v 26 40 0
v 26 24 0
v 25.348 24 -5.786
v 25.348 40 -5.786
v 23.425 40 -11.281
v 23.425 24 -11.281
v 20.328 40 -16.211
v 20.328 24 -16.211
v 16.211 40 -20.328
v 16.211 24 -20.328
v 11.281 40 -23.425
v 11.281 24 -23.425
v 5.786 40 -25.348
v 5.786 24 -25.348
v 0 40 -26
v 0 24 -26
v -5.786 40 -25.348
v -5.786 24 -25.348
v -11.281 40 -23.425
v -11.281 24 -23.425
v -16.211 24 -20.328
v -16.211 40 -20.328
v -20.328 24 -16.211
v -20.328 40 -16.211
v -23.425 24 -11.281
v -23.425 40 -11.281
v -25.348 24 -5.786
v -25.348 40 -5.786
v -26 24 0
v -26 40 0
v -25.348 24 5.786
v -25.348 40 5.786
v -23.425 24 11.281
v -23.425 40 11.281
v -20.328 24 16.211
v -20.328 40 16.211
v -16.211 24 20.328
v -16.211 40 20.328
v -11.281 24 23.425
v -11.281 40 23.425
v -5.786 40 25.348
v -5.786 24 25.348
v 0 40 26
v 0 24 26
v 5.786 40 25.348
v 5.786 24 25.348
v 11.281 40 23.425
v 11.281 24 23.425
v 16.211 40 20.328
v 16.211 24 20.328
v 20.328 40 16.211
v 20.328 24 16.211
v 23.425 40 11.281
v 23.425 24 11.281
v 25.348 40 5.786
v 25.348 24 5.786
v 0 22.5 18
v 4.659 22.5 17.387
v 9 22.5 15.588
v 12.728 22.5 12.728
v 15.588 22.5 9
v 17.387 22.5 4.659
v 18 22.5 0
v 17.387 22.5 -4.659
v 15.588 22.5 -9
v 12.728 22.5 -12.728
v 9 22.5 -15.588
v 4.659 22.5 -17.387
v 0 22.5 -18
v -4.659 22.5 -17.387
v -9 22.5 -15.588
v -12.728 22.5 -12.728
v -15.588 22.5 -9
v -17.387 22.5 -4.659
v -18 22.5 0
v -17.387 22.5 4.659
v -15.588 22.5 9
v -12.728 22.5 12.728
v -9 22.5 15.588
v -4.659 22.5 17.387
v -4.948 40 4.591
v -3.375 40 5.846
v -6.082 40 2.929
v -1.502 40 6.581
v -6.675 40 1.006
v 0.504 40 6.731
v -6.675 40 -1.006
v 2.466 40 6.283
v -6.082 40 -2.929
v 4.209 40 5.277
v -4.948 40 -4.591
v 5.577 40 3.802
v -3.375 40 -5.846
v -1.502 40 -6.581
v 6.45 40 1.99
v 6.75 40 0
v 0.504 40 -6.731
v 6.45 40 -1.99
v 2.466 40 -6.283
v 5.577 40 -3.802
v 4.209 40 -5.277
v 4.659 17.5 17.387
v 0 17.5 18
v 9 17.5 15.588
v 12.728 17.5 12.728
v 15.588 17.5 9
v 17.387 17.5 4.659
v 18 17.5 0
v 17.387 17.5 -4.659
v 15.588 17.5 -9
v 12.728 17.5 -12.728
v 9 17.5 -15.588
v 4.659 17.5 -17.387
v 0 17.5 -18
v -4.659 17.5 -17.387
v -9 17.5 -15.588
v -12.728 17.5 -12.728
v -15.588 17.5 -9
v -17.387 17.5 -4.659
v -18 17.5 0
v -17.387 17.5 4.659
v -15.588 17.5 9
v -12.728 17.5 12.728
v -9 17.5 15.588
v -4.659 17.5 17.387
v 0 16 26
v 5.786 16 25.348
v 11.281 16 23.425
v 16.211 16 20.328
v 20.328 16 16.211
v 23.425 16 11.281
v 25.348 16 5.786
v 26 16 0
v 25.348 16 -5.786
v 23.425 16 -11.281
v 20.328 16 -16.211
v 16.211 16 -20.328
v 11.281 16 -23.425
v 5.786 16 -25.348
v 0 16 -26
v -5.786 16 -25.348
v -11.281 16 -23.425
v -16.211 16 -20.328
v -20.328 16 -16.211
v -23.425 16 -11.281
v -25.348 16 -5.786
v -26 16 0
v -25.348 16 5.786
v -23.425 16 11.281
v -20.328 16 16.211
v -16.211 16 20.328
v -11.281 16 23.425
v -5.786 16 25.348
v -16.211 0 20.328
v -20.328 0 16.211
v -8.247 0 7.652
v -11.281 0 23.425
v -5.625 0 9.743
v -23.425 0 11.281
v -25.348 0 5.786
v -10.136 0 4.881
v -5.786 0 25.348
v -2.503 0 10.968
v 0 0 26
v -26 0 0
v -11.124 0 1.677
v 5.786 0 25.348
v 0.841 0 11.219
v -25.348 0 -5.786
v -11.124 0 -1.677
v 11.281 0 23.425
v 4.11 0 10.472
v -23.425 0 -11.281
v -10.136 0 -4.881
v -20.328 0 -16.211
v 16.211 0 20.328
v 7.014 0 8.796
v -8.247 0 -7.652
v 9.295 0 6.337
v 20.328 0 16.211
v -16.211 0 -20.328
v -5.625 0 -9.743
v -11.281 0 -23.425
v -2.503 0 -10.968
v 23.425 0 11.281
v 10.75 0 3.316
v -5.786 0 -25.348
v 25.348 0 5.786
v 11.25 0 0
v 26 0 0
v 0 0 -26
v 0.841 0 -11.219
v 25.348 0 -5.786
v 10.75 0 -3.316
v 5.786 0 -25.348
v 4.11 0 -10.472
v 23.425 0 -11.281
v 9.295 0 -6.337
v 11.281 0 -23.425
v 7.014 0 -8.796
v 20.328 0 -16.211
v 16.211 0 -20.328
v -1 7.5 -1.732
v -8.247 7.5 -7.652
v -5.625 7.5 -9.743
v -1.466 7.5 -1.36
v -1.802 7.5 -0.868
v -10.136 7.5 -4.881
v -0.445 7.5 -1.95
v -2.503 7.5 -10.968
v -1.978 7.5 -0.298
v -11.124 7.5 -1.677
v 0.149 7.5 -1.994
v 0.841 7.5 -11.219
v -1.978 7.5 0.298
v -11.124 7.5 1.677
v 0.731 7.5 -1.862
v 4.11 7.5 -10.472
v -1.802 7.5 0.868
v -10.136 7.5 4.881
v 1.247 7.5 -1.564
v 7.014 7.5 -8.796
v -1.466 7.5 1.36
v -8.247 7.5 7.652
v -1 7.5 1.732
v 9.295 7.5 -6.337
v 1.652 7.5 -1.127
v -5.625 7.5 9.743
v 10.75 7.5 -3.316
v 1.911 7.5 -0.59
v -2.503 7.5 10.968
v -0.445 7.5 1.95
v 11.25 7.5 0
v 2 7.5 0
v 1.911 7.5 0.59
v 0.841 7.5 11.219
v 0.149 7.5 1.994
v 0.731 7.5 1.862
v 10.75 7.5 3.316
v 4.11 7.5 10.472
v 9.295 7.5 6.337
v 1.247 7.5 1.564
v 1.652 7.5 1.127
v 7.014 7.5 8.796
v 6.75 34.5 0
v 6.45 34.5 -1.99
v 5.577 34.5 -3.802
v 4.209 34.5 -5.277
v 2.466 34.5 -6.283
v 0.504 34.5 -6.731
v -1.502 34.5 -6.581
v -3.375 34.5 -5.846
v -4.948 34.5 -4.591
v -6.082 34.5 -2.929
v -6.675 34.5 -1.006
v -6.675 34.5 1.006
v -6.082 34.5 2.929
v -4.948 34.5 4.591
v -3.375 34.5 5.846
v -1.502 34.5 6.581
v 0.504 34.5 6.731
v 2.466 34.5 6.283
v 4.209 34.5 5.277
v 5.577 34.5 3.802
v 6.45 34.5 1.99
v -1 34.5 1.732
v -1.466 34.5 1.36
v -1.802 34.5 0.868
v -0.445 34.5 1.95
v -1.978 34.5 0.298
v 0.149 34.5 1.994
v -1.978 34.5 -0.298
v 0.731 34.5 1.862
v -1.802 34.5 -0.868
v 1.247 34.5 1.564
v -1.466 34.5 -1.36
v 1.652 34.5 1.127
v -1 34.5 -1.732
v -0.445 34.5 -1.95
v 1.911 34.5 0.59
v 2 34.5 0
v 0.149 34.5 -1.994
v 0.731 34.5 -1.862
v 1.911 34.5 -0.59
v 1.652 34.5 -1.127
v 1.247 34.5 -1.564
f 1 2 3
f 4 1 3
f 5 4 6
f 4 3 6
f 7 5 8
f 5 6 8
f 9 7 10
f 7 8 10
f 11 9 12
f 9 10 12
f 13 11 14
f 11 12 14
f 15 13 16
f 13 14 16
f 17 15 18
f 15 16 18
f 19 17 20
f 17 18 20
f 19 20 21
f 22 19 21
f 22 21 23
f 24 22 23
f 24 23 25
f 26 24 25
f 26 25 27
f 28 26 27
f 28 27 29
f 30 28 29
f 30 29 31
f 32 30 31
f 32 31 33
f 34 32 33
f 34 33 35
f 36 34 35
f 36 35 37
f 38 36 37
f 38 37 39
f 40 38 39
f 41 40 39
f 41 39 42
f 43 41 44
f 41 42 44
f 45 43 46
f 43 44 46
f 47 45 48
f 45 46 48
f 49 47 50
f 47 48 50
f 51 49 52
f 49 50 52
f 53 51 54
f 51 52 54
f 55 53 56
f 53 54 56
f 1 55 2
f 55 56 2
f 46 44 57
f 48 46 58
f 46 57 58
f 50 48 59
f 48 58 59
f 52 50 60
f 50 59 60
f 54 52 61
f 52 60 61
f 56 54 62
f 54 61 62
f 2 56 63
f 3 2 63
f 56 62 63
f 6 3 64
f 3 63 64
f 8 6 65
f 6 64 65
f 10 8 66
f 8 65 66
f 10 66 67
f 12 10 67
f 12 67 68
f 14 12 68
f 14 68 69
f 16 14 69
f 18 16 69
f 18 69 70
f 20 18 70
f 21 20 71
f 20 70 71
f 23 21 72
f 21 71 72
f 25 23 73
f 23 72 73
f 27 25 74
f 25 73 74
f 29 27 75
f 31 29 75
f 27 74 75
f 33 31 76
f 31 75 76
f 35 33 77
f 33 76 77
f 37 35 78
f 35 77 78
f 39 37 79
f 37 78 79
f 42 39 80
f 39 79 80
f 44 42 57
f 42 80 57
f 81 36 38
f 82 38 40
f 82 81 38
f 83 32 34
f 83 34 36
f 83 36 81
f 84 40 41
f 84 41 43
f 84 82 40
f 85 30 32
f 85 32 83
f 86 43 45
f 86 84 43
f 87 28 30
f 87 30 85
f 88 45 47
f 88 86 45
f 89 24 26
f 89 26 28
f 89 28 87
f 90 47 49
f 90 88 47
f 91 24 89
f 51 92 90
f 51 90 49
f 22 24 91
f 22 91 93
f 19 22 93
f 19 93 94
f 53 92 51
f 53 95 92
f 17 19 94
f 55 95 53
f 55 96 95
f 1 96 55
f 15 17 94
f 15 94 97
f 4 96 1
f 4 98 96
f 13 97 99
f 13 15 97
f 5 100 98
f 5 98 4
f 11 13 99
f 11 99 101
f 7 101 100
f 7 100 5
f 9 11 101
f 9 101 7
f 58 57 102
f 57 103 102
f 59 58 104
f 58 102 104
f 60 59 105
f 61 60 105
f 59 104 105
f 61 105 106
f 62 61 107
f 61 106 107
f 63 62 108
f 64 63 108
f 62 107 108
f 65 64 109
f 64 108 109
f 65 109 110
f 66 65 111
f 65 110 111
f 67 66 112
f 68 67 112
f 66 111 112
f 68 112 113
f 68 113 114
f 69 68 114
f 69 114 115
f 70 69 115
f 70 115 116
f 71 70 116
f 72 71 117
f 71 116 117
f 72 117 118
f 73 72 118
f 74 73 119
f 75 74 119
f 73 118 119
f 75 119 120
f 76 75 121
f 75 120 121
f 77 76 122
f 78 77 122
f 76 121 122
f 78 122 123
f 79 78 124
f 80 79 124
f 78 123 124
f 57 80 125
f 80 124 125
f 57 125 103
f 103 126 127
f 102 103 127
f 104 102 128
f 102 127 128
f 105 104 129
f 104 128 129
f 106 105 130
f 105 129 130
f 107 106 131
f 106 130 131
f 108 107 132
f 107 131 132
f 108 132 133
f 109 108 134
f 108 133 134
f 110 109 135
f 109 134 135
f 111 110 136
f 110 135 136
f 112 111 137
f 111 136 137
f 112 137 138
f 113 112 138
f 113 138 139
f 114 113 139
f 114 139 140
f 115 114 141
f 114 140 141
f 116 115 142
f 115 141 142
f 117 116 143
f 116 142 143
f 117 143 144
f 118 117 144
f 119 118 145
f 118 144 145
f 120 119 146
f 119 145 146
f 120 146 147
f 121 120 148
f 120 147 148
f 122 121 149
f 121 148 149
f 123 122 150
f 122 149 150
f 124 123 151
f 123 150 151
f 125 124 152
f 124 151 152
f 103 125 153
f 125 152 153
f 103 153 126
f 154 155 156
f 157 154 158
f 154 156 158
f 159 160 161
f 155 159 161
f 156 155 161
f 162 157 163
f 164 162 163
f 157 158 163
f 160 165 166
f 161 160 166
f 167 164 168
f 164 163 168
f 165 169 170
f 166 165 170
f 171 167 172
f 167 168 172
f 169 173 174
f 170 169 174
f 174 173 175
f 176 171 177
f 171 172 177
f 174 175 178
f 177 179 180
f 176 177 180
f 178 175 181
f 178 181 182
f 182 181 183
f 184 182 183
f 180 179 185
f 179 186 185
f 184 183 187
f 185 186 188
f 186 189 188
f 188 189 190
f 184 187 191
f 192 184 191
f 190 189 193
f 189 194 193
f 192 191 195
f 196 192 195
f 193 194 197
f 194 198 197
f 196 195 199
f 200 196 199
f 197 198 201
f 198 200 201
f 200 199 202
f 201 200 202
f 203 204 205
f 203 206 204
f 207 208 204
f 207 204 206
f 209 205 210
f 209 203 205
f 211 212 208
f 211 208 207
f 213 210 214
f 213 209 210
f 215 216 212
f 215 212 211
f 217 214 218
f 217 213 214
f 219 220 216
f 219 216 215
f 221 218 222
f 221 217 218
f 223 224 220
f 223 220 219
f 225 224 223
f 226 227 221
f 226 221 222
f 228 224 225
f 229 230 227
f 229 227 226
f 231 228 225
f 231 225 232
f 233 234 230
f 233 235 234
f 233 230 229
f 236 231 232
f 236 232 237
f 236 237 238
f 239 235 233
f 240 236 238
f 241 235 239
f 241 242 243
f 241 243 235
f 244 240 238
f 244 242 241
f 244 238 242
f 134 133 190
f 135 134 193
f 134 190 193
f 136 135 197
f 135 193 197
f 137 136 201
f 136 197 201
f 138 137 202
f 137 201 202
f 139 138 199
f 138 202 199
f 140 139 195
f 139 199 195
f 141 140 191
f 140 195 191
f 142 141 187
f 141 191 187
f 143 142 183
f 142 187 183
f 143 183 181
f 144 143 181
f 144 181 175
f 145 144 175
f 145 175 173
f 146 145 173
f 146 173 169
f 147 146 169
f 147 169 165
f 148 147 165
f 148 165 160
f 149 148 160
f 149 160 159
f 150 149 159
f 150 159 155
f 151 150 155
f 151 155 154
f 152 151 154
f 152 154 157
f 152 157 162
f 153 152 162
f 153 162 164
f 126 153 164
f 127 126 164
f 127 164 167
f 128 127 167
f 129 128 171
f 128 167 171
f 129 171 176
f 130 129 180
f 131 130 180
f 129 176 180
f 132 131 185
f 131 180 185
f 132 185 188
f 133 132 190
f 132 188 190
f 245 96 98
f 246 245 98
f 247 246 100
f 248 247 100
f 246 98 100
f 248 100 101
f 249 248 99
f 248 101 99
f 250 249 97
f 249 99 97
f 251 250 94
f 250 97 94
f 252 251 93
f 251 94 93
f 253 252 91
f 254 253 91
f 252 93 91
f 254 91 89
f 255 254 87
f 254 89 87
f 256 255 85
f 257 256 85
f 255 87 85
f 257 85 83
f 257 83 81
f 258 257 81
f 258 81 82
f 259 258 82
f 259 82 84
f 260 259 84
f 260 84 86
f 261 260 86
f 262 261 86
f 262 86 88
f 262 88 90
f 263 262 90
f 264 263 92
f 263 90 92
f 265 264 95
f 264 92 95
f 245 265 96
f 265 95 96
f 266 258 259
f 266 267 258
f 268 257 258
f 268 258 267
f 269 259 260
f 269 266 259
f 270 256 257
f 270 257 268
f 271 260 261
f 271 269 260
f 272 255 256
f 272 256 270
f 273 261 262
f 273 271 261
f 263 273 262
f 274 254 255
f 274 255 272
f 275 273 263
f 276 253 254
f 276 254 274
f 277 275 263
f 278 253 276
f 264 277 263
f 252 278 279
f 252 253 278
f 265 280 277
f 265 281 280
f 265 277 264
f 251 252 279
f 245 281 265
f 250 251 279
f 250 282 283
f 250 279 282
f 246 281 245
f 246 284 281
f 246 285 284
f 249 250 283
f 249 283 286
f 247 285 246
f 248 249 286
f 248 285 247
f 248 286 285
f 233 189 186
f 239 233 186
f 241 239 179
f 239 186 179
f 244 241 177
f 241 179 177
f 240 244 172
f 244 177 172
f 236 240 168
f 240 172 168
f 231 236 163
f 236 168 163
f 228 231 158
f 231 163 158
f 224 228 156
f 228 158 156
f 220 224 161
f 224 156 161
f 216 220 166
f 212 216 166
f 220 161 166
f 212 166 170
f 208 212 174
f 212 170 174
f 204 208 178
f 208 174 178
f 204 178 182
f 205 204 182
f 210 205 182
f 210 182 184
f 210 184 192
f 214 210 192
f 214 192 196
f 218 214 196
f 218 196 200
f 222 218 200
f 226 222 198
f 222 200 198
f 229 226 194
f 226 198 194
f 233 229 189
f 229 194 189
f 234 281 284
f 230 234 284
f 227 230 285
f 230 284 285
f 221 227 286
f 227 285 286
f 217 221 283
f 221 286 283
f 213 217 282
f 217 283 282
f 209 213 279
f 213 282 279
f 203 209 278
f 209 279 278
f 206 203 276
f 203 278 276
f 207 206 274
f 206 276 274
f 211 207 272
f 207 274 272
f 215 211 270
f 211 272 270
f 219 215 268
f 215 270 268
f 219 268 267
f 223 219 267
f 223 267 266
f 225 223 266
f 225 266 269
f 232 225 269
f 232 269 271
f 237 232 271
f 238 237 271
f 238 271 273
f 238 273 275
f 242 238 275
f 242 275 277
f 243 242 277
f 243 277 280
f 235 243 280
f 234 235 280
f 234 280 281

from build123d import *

# Parameters (mm, degrees)
SKETCH1_R                = 26
BOSS_EXTRUDE1_DEPTH      = 40
SKETCH2_R                = 11.25
F_608_BEARING_HOLE_DEPTH = 7.5
SKETCH3_R                = 6.75
F_624_BEARING_HOLE_DEPTH = 5.5
SKETCH4_R                = 2
CUT_EXTRUDE3_DEPTH       = 55.332310829


with BuildPart() as part:
    # Sketch1 → Boss-Extrude1 (new body)
    with BuildSketch(Plane(origin=(0, 0, 0), x_dir=(1, 0, 0), z_dir=(0, 1, 0))):
        Circle(SKETCH1_R)
    extrude(amount=BOSS_EXTRUDE1_DEPTH)

    # Sketch2 → 608_Bearing_Hole (cut)
    with BuildSketch(Plane.XZ):
        Circle(SKETCH2_R)
    extrude(amount=-F_608_BEARING_HOLE_DEPTH, mode=Mode.SUBTRACT)

    # Sketch3 → 624_Bearing_Hole (cut)
    with BuildSketch(Plane(origin=(0, 40, 0), x_dir=(1, 0, 0), z_dir=(0, 1, 0))):
        Circle(SKETCH3_R)
    extrude(amount=-F_624_BEARING_HOLE_DEPTH, mode=Mode.SUBTRACT)

    # Sketch4 → Cut-Extrude3 (cut, through all)
    with BuildSketch(Plane(origin=(0, 40, 0), x_dir=(1, 0, 0), z_dir=(0, 1, 0))):
        Circle(SKETCH4_R)
    extrude(amount=-CUT_EXTRUDE3_DEPTH, mode=Mode.SUBTRACT)

    # Sketch5 → Cut-Revolve1 (revolve, cut)
    with BuildSketch(Plane(origin=(0, 0, 0), x_dir=(0, 0, -1), z_dir=(1, 0, 0))):
        Polygon((-26, 16), (-18, 17.5), (-18, 22.5), (-26, 24), align=None)
    revolve(axis=Axis((0, 0, 0), (0, 1, 0)), mode=Mode.SUBTRACT)


solid = part.part
